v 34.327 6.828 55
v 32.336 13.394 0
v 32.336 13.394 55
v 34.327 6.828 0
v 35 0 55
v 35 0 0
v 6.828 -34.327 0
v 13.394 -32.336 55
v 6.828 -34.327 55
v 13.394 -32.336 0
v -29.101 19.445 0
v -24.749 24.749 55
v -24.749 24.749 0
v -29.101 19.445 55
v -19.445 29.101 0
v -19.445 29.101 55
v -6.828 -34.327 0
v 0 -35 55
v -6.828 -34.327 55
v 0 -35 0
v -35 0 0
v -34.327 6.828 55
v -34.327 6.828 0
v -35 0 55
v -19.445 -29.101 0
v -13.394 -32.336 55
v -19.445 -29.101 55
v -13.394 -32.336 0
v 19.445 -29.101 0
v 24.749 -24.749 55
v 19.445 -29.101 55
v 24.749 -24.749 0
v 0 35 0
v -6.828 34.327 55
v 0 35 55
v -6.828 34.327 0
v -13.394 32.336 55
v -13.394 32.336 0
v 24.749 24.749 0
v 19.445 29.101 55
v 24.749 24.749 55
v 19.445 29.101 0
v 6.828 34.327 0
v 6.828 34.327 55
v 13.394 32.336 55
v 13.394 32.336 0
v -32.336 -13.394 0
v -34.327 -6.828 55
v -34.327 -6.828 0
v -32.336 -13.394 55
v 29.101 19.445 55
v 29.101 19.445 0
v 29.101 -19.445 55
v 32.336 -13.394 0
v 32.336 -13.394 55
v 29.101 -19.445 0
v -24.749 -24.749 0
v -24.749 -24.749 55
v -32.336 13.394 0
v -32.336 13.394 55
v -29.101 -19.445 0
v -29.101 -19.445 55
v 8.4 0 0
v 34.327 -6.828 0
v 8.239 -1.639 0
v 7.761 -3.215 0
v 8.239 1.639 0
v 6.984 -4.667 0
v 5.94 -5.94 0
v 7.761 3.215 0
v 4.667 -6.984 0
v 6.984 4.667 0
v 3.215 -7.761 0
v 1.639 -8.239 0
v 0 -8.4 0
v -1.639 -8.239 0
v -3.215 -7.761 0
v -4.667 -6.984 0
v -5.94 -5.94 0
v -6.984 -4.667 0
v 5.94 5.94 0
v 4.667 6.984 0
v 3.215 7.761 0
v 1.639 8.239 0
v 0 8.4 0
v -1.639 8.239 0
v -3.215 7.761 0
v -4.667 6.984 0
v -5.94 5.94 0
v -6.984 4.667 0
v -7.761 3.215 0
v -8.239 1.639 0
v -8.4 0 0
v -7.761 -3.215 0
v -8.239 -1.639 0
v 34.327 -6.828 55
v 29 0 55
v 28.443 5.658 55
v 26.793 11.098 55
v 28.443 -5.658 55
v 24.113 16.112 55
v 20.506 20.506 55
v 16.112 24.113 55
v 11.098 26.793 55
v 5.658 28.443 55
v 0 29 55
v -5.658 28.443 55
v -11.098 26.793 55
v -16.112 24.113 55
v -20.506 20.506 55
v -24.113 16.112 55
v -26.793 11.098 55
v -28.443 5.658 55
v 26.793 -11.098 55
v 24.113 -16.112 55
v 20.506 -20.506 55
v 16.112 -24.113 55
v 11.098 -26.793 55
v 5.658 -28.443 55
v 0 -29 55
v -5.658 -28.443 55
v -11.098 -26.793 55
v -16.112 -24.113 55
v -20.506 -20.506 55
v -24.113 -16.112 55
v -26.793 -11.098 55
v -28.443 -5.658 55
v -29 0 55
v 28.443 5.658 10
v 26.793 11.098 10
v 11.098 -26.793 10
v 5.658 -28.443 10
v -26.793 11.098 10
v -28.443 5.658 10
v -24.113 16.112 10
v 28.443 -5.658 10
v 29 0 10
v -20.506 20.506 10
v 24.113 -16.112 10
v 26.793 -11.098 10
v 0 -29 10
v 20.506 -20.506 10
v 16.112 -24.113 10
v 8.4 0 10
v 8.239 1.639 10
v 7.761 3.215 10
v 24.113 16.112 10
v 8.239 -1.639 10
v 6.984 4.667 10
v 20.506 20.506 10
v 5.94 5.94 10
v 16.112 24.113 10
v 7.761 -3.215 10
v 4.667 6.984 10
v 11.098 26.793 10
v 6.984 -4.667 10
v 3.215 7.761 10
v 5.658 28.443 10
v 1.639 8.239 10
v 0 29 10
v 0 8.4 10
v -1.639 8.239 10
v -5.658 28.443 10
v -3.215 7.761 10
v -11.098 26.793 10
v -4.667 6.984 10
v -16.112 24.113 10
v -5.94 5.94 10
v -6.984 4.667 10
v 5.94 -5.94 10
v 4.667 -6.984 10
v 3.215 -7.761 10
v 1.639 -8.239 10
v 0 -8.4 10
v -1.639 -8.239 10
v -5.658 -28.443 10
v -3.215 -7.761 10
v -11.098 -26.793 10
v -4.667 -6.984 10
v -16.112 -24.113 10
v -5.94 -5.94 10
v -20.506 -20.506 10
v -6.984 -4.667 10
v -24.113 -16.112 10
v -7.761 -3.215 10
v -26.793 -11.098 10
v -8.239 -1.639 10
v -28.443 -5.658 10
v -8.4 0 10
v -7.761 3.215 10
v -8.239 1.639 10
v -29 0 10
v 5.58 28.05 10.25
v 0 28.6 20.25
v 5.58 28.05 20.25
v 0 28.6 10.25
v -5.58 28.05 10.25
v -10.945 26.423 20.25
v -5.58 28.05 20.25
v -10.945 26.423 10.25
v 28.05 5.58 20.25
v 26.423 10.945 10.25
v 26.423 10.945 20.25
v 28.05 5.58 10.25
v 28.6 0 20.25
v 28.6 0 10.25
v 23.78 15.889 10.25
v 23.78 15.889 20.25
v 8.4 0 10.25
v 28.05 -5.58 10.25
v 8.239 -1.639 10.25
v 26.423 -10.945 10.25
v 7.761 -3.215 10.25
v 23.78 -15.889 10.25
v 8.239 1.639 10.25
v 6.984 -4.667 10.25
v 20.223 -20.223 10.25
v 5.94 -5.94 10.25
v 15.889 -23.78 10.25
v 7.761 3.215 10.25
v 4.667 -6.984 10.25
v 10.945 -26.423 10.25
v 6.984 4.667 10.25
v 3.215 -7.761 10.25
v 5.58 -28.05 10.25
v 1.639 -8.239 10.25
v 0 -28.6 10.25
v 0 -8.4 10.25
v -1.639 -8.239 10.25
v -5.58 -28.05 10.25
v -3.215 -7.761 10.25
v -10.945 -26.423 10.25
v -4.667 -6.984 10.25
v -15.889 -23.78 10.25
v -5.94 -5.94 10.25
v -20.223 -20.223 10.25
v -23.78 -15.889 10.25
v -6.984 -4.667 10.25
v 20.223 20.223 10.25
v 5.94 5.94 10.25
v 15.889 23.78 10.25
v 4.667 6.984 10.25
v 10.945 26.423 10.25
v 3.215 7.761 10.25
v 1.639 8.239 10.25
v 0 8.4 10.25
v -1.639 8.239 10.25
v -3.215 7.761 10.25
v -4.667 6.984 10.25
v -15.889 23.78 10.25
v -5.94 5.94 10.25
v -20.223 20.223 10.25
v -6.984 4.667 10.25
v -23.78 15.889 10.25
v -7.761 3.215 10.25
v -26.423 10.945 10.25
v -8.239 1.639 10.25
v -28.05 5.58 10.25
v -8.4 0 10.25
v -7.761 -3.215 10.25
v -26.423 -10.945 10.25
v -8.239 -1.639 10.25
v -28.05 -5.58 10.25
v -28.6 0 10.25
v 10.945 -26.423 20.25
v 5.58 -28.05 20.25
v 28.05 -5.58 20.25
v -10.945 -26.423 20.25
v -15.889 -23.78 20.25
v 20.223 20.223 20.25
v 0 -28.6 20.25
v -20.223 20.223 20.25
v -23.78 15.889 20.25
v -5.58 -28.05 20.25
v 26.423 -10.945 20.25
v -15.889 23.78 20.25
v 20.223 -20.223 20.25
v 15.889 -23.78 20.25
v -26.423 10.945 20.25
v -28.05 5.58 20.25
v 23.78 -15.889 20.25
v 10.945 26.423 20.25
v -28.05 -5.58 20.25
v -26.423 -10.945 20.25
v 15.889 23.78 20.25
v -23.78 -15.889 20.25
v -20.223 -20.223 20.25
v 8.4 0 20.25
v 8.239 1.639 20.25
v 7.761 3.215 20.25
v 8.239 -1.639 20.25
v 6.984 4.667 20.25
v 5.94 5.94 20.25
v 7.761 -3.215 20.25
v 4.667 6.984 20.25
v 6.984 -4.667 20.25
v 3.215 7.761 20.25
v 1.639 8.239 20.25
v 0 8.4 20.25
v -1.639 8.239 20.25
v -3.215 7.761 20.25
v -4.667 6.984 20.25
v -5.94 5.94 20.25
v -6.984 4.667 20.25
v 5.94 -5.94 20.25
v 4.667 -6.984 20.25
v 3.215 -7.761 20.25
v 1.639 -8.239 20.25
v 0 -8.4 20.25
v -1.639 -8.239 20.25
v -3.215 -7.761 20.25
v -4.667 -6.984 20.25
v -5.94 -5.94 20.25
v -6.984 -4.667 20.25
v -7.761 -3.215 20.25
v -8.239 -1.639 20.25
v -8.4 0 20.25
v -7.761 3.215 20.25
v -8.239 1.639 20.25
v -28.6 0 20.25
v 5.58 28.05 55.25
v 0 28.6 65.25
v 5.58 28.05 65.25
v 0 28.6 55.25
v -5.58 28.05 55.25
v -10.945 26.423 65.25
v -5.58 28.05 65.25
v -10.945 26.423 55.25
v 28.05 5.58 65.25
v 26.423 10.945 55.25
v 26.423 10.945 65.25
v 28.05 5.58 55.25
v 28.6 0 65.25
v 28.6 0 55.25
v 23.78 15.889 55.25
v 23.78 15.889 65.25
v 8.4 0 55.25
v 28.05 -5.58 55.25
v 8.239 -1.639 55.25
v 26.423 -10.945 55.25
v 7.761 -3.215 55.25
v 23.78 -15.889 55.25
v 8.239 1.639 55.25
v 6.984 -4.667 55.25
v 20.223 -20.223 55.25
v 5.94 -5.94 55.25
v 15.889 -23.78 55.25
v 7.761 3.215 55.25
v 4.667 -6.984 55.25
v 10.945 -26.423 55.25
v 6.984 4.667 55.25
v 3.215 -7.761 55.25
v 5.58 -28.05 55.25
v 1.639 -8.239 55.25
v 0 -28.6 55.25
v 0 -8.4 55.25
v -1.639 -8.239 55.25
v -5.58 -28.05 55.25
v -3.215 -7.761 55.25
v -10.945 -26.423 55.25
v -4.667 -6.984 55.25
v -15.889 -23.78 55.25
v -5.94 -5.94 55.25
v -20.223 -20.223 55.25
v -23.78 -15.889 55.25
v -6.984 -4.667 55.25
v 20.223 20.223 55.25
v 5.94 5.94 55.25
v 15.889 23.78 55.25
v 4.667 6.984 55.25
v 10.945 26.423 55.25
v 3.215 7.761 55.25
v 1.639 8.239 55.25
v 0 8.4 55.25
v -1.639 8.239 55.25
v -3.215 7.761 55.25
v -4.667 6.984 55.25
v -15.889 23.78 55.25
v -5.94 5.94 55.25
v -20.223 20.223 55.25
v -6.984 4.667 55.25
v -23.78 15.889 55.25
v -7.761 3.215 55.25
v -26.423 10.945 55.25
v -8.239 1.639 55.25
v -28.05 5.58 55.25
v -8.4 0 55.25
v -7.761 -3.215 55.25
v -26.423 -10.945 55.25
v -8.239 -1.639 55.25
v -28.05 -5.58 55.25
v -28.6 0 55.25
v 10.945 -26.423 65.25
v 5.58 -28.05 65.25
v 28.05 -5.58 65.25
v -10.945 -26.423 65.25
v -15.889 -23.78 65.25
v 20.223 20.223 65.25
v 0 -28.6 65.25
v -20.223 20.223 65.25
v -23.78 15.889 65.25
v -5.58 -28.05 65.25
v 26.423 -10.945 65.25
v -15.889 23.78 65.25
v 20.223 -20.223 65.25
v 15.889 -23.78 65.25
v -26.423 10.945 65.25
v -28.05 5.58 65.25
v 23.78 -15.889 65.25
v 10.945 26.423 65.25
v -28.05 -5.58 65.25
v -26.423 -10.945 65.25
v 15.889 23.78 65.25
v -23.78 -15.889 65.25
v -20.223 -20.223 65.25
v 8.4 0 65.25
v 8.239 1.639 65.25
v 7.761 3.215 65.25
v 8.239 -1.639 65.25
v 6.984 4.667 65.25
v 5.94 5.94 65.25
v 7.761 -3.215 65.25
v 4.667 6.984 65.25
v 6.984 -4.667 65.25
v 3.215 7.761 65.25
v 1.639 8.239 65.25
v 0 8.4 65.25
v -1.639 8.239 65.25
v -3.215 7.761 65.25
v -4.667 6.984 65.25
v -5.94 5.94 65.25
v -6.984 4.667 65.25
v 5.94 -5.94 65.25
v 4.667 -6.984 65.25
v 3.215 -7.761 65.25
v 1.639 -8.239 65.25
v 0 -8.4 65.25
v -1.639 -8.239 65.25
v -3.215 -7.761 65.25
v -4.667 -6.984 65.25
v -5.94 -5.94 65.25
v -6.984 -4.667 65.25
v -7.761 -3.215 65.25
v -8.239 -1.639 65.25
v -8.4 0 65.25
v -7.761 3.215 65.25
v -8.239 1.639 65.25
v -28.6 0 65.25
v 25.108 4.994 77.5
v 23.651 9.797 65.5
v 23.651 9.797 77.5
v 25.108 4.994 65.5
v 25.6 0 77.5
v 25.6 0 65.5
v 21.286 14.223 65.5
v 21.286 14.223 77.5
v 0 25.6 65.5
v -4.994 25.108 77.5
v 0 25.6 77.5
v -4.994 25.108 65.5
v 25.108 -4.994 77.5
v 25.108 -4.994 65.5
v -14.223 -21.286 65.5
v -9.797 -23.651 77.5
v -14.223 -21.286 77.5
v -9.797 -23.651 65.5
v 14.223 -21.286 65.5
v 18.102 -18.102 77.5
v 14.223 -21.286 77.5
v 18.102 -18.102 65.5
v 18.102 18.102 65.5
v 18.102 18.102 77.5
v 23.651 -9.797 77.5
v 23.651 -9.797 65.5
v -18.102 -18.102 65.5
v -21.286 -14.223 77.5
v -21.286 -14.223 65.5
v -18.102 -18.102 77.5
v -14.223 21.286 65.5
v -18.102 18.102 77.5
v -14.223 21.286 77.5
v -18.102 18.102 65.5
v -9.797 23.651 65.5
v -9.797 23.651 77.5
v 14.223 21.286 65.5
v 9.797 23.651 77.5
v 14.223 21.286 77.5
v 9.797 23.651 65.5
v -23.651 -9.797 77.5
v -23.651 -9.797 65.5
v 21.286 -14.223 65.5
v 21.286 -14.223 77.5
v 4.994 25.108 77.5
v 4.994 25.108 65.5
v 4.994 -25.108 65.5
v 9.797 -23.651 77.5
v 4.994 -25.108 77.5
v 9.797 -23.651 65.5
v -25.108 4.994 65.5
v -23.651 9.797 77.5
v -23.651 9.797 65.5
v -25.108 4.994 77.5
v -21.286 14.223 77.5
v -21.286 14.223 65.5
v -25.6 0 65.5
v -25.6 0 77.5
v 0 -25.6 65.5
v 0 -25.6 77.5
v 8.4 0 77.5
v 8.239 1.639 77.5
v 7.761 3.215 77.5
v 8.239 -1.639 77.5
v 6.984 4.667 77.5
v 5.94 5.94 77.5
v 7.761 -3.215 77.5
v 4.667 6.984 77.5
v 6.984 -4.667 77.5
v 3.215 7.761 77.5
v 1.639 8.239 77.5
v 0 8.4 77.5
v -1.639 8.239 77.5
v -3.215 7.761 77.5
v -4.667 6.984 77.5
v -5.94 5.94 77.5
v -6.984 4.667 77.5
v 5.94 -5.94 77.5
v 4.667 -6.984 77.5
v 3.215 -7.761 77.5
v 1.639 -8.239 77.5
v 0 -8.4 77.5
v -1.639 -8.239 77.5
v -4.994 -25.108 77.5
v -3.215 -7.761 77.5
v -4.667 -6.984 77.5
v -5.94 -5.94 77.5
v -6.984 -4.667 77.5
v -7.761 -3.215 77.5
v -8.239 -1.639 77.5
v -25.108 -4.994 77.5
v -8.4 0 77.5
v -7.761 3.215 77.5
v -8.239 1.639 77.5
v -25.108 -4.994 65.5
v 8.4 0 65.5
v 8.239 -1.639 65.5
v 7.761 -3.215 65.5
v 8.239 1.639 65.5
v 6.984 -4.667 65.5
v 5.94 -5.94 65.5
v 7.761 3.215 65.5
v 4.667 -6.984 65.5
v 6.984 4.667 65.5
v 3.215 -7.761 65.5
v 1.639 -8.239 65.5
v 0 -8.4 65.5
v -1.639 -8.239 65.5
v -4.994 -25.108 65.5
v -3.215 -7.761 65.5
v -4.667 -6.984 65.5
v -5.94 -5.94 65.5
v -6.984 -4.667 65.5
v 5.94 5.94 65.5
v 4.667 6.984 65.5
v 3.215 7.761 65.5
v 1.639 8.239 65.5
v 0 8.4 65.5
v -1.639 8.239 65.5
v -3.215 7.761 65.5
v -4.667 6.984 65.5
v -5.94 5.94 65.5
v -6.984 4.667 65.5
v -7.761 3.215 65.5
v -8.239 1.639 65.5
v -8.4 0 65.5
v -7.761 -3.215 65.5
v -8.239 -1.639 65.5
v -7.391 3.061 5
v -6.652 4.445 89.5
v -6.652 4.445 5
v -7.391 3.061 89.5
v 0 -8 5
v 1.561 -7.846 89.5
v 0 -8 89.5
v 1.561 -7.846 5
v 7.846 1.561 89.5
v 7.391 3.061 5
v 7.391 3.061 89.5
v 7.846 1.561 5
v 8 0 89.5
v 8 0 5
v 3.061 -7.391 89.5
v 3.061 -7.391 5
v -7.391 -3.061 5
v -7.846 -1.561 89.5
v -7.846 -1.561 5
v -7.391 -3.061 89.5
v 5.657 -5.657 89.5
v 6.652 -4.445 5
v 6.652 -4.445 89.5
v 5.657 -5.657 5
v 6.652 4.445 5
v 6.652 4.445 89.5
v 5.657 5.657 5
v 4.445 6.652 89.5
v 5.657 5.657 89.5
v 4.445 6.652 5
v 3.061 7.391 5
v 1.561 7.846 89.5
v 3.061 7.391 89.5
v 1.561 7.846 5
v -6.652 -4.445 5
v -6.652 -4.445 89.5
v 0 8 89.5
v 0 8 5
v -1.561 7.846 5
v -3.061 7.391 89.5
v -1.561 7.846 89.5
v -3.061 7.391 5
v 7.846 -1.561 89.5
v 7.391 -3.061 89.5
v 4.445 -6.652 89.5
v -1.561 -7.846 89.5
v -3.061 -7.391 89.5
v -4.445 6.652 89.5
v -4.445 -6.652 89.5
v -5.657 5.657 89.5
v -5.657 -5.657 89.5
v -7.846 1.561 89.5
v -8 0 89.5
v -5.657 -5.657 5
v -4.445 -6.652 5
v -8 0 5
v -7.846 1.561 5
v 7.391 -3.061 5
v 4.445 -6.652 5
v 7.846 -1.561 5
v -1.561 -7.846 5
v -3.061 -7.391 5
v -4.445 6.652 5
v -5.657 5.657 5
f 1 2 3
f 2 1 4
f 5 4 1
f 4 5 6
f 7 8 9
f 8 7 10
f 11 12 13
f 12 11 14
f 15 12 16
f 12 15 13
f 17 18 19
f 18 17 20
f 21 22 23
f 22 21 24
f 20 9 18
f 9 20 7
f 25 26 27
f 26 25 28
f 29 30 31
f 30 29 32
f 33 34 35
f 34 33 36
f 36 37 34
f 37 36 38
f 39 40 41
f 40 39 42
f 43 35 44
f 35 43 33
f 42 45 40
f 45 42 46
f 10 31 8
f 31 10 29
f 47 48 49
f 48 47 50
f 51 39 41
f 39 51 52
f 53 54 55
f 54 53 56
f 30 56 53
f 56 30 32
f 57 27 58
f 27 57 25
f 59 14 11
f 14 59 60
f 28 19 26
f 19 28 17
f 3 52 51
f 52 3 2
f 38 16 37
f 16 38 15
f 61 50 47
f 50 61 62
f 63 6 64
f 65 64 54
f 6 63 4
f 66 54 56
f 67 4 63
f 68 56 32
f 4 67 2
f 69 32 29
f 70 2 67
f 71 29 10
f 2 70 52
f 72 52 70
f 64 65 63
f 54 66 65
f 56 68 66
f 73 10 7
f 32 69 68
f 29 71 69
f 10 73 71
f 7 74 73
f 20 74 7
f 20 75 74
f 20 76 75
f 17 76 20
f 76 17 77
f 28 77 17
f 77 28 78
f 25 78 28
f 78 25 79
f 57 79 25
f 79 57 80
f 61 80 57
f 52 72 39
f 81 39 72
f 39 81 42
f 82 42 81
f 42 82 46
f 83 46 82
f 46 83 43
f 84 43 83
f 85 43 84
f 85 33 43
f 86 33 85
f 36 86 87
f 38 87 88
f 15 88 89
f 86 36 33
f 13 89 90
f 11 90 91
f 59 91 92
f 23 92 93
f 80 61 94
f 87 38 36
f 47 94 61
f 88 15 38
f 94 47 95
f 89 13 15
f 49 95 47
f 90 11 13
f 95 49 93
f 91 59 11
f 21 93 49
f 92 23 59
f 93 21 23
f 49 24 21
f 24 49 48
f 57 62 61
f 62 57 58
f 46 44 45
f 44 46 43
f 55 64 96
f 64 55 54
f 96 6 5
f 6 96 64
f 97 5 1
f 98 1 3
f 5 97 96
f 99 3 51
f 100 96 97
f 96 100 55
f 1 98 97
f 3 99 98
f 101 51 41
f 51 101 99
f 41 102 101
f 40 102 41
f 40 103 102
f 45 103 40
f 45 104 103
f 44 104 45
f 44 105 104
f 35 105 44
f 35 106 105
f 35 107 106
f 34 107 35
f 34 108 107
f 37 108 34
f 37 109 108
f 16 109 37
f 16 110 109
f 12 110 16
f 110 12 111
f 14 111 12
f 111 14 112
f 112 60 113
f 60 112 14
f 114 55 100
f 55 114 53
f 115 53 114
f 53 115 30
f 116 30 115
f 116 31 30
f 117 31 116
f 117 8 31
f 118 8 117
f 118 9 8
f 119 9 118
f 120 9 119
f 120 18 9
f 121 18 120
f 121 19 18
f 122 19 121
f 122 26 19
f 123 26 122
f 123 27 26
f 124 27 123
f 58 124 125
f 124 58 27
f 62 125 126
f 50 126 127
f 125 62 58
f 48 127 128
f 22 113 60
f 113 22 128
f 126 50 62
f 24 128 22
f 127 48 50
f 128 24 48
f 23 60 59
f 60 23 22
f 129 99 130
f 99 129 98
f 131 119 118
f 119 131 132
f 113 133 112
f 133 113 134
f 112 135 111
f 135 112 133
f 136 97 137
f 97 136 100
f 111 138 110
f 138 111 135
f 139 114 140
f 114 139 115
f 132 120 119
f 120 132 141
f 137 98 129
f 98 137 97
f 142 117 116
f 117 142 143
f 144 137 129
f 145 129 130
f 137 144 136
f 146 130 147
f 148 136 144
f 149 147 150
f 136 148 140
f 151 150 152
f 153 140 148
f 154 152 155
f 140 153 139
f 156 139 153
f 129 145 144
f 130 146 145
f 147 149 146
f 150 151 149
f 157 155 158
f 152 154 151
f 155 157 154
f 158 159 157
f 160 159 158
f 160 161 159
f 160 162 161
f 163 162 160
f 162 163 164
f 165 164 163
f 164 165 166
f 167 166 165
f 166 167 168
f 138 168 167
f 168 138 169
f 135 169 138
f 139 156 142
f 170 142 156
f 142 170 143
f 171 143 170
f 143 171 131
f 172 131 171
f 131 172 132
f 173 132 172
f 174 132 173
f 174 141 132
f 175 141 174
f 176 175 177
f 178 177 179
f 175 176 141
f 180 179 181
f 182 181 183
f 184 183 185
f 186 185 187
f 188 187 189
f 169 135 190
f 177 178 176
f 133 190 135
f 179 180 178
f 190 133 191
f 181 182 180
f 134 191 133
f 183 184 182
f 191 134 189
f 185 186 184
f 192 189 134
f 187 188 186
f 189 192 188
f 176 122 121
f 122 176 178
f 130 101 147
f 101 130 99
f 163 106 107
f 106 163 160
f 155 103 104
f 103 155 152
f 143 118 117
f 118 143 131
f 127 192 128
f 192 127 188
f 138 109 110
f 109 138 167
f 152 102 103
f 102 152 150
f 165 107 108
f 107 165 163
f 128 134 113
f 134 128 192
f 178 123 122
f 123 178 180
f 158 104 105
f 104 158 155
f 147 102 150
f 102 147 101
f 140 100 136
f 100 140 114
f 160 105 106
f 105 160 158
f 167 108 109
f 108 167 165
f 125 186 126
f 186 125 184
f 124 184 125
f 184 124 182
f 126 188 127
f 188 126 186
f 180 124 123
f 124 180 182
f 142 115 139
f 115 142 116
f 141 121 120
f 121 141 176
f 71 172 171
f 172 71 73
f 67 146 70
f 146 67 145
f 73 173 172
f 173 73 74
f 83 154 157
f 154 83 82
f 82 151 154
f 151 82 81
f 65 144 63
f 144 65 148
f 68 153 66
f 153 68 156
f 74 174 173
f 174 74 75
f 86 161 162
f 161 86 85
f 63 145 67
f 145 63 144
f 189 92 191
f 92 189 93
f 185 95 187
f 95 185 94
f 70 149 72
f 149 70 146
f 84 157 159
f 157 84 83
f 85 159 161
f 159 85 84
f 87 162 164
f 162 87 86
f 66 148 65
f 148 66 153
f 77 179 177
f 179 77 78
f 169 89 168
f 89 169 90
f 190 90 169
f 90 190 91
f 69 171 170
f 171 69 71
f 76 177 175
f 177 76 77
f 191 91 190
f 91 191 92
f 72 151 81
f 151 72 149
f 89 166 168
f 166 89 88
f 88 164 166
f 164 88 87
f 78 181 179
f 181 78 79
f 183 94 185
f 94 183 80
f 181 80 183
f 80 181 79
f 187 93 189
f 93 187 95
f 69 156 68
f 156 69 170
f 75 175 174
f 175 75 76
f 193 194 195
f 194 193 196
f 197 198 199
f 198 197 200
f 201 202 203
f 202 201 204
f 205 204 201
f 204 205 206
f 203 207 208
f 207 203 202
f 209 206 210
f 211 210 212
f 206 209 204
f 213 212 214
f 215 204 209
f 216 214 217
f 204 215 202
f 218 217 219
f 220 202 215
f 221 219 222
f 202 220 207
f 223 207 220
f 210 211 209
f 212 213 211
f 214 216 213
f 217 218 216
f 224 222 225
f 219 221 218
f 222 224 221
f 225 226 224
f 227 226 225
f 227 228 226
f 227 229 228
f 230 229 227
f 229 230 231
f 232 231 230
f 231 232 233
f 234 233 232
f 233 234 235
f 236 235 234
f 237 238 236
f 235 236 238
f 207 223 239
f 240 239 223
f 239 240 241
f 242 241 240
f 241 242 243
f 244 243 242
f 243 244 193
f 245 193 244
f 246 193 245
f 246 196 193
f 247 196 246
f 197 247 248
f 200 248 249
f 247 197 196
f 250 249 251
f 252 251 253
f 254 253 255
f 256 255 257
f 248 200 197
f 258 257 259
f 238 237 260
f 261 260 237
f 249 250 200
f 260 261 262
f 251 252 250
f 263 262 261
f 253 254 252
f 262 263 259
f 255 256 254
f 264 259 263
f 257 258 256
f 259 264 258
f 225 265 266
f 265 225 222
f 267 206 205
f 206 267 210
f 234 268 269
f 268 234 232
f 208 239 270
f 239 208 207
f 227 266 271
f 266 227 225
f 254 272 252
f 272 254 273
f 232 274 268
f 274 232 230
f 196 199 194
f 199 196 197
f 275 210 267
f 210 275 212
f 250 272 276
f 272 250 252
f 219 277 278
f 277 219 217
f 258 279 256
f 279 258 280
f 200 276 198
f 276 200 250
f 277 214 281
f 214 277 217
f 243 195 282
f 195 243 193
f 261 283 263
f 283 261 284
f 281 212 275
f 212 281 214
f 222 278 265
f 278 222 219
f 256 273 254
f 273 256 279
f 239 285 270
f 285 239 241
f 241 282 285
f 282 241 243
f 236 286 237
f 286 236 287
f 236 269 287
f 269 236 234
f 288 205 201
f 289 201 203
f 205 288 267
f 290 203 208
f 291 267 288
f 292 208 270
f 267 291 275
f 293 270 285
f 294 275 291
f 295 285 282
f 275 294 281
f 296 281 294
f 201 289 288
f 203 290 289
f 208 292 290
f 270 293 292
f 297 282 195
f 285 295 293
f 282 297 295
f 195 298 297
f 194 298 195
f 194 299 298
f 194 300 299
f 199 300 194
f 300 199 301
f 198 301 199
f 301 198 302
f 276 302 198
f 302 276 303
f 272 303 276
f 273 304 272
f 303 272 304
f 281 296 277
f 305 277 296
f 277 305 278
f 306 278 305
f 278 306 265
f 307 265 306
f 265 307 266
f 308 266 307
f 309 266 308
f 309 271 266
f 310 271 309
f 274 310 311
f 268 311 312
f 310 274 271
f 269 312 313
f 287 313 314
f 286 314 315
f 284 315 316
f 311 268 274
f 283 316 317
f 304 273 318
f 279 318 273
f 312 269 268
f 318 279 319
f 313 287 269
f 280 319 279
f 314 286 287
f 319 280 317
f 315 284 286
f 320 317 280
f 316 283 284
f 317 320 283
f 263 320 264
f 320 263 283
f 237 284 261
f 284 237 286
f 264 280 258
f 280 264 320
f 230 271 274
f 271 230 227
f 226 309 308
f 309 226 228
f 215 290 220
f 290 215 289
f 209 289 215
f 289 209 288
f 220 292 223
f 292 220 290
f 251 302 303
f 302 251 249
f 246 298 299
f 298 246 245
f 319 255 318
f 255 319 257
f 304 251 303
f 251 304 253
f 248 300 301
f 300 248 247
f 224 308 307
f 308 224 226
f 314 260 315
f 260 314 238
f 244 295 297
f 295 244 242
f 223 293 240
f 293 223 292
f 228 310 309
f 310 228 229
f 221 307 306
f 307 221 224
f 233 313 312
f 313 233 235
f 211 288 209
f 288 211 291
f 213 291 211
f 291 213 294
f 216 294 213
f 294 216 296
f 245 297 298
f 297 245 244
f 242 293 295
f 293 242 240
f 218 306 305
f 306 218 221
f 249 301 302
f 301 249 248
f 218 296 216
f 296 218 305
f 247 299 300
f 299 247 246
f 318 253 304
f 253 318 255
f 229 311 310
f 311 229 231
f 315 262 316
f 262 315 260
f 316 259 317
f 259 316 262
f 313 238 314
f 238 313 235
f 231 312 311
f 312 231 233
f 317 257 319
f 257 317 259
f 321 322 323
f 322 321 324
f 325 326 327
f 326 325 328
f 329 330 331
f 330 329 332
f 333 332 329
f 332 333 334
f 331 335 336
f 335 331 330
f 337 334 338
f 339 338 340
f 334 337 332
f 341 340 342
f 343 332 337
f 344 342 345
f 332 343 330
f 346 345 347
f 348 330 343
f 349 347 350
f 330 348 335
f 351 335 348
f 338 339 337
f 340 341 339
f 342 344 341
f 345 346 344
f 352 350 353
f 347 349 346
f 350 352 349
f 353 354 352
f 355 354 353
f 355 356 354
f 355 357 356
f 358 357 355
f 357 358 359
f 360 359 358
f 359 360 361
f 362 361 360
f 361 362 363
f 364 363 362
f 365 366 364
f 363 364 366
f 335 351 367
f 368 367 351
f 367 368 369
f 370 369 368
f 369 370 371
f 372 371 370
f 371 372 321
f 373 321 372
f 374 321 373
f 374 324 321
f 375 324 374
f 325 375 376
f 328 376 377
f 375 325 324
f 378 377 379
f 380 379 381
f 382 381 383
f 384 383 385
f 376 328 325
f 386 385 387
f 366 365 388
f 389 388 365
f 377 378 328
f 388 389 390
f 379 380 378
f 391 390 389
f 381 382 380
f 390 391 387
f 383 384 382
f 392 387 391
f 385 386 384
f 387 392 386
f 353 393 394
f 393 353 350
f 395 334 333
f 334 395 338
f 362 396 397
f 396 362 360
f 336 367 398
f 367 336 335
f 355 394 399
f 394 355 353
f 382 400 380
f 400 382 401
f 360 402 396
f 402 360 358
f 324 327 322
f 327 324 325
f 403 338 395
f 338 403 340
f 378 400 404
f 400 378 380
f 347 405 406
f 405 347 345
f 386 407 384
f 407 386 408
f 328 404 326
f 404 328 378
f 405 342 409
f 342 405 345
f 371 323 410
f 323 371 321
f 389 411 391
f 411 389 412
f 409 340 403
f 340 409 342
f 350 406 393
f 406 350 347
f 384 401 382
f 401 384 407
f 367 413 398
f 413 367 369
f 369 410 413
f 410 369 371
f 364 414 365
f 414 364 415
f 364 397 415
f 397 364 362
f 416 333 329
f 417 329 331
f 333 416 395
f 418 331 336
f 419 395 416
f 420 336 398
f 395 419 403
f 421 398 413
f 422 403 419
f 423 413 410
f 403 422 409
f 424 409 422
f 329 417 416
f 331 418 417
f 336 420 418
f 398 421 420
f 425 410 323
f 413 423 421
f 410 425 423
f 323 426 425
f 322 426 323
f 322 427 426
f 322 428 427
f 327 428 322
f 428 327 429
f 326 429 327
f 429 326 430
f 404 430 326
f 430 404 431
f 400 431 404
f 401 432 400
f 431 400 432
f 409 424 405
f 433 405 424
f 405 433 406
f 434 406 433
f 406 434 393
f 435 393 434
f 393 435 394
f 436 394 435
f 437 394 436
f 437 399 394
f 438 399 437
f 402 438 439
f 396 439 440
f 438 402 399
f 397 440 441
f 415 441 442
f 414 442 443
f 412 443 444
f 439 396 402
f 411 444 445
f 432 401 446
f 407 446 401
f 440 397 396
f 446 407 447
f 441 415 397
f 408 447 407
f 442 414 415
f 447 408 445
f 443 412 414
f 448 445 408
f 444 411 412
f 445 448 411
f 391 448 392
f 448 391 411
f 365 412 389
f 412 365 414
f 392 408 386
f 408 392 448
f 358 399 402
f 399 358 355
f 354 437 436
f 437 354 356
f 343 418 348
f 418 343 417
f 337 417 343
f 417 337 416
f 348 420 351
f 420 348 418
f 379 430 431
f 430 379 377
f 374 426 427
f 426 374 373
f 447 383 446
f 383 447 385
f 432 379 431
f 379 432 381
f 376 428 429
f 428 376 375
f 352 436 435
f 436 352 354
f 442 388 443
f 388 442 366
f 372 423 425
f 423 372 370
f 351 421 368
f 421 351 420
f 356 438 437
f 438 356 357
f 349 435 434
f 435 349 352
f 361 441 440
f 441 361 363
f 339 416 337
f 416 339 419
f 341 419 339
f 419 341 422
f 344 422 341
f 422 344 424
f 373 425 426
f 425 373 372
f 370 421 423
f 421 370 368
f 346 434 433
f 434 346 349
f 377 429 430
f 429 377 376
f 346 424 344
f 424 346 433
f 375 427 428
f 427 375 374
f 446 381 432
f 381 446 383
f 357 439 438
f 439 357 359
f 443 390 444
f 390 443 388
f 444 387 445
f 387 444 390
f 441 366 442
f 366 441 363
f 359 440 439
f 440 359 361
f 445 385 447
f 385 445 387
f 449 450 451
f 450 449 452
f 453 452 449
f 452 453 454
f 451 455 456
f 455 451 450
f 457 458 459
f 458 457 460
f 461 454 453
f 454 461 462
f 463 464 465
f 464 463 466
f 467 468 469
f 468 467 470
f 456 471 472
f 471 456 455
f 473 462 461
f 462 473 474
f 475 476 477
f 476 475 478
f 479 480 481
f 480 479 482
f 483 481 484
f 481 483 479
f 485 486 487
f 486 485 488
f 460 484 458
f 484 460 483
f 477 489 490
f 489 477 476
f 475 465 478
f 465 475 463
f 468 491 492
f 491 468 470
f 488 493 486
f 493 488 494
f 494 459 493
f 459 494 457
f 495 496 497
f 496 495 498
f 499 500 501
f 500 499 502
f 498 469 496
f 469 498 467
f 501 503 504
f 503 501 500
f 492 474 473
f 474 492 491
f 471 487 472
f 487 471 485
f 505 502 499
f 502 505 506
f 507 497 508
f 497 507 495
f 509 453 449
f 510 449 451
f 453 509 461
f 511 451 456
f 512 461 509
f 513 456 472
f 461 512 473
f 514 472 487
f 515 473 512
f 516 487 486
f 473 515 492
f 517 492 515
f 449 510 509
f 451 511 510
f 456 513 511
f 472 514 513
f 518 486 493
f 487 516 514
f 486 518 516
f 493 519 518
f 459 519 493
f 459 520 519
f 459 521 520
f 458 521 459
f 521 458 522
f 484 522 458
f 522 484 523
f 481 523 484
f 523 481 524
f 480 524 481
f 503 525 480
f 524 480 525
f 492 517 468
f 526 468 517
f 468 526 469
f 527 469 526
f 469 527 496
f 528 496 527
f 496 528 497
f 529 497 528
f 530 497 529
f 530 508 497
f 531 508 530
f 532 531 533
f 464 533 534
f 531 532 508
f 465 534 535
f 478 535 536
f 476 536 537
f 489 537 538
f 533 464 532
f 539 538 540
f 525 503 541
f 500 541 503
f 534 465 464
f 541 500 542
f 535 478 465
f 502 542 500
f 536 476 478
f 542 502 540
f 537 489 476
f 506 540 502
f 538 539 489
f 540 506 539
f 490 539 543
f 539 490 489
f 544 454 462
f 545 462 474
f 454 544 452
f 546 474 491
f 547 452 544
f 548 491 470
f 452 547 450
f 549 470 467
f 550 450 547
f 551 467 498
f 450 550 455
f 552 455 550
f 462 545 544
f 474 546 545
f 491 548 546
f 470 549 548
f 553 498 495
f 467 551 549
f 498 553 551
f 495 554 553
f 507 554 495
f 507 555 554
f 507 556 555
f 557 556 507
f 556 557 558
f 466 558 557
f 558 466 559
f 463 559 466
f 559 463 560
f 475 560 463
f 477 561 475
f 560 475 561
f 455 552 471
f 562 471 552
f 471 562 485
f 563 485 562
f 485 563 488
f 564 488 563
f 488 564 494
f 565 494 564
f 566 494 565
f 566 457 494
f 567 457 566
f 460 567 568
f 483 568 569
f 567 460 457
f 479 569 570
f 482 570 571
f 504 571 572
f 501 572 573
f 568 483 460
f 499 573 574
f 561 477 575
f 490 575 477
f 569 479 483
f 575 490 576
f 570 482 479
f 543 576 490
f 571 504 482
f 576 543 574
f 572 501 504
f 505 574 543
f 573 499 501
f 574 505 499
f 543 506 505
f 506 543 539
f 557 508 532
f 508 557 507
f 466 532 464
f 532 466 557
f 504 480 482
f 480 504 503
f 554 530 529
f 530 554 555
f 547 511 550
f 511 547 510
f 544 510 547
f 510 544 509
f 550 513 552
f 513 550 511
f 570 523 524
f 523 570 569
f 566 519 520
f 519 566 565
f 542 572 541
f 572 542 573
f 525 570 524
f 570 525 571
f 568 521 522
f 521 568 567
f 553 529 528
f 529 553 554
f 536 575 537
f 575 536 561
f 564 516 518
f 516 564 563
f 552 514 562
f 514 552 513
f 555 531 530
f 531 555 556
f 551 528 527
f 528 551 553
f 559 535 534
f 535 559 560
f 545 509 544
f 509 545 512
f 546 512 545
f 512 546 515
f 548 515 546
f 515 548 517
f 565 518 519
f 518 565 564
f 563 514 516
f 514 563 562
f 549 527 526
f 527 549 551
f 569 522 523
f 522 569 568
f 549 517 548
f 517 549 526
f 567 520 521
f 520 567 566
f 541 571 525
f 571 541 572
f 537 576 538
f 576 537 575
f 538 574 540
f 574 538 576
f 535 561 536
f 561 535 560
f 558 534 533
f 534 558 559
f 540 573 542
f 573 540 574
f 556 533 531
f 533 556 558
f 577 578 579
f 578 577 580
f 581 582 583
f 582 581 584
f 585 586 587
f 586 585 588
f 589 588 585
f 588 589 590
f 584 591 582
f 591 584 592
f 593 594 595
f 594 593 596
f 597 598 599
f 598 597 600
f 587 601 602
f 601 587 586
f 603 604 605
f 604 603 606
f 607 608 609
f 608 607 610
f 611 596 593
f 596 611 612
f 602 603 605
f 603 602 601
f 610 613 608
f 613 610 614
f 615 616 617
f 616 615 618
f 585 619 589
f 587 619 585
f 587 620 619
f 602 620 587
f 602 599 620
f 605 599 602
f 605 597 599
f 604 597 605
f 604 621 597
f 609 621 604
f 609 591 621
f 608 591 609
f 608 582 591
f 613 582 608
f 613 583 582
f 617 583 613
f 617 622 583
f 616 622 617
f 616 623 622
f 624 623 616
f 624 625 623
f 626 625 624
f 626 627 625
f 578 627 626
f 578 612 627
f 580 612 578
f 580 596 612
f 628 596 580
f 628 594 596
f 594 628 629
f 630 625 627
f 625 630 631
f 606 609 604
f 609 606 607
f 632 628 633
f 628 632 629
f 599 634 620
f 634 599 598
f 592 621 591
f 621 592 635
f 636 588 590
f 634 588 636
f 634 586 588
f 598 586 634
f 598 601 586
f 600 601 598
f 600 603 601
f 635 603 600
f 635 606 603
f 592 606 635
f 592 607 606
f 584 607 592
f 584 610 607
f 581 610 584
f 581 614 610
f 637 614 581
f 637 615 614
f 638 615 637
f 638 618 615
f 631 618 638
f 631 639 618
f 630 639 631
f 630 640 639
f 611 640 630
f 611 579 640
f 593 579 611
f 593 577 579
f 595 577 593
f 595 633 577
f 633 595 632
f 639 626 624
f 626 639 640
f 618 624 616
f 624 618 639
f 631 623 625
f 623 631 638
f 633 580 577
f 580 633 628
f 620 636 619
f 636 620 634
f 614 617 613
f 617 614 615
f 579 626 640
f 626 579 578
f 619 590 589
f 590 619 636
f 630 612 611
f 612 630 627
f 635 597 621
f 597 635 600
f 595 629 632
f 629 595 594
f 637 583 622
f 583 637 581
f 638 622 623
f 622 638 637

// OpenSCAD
$fn = 32;

// ------------------------------------------------------------------------
// Bearing housing: housing d70, two bearings and a shaft
// Every part is its own module, assembly() places them once.
// ------------------------------------------------------------------------

// --- part 1 ---
module housing() {
  difference() {
    cylinder(h = 55, d = 70);
    translate([0, 0, 10]) cylinder(h = 46, d = 58);
    translate([0, 0, -1]) cylinder(h = 12, d = 16.8);
  }
}

// --- part 2 ---
module bearing_lower() {
  difference() {
      translate([0, 0, 0]) cylinder(h = 10, d = 57.2);
      translate([0, 0, -1]) cylinder(h = 12, d = 16.8);
    }
}

// --- part 3 ---
module bearing_upper() {
  difference() {
      translate([0, 0, 0]) cylinder(h = 10, d = 57.2);
      translate([0, 0, -1]) cylinder(h = 12, d = 16.8);
    }
}

// --- part 4 ---
module spacer() {
  difference() {
      translate([0, 0, 0]) cylinder(h = 12, d = 51.2);
      translate([0, 0, -1]) cylinder(h = 14, d = 16.8);
    }
}

// --- part 5 ---
module shaft() {
  translate([0, 0, -42.25]) cylinder(h = 84.5, d = 16);
}

// --- assembly ---
module assembly() {
  translate([0, 0, 0]) rotate([0, 0, 0]) housing();
  translate([0, 0, 10.25]) rotate([0, 0, 0]) bearing_lower();
  translate([0, 0, 55.25]) rotate([0, 0, 0]) bearing_upper();
  translate([0, 0, 65.5]) rotate([0, 0, 0]) spacer();
  translate([0, 0, 47.25]) rotate([0, 0, 0]) shaft();
}

assembly();
